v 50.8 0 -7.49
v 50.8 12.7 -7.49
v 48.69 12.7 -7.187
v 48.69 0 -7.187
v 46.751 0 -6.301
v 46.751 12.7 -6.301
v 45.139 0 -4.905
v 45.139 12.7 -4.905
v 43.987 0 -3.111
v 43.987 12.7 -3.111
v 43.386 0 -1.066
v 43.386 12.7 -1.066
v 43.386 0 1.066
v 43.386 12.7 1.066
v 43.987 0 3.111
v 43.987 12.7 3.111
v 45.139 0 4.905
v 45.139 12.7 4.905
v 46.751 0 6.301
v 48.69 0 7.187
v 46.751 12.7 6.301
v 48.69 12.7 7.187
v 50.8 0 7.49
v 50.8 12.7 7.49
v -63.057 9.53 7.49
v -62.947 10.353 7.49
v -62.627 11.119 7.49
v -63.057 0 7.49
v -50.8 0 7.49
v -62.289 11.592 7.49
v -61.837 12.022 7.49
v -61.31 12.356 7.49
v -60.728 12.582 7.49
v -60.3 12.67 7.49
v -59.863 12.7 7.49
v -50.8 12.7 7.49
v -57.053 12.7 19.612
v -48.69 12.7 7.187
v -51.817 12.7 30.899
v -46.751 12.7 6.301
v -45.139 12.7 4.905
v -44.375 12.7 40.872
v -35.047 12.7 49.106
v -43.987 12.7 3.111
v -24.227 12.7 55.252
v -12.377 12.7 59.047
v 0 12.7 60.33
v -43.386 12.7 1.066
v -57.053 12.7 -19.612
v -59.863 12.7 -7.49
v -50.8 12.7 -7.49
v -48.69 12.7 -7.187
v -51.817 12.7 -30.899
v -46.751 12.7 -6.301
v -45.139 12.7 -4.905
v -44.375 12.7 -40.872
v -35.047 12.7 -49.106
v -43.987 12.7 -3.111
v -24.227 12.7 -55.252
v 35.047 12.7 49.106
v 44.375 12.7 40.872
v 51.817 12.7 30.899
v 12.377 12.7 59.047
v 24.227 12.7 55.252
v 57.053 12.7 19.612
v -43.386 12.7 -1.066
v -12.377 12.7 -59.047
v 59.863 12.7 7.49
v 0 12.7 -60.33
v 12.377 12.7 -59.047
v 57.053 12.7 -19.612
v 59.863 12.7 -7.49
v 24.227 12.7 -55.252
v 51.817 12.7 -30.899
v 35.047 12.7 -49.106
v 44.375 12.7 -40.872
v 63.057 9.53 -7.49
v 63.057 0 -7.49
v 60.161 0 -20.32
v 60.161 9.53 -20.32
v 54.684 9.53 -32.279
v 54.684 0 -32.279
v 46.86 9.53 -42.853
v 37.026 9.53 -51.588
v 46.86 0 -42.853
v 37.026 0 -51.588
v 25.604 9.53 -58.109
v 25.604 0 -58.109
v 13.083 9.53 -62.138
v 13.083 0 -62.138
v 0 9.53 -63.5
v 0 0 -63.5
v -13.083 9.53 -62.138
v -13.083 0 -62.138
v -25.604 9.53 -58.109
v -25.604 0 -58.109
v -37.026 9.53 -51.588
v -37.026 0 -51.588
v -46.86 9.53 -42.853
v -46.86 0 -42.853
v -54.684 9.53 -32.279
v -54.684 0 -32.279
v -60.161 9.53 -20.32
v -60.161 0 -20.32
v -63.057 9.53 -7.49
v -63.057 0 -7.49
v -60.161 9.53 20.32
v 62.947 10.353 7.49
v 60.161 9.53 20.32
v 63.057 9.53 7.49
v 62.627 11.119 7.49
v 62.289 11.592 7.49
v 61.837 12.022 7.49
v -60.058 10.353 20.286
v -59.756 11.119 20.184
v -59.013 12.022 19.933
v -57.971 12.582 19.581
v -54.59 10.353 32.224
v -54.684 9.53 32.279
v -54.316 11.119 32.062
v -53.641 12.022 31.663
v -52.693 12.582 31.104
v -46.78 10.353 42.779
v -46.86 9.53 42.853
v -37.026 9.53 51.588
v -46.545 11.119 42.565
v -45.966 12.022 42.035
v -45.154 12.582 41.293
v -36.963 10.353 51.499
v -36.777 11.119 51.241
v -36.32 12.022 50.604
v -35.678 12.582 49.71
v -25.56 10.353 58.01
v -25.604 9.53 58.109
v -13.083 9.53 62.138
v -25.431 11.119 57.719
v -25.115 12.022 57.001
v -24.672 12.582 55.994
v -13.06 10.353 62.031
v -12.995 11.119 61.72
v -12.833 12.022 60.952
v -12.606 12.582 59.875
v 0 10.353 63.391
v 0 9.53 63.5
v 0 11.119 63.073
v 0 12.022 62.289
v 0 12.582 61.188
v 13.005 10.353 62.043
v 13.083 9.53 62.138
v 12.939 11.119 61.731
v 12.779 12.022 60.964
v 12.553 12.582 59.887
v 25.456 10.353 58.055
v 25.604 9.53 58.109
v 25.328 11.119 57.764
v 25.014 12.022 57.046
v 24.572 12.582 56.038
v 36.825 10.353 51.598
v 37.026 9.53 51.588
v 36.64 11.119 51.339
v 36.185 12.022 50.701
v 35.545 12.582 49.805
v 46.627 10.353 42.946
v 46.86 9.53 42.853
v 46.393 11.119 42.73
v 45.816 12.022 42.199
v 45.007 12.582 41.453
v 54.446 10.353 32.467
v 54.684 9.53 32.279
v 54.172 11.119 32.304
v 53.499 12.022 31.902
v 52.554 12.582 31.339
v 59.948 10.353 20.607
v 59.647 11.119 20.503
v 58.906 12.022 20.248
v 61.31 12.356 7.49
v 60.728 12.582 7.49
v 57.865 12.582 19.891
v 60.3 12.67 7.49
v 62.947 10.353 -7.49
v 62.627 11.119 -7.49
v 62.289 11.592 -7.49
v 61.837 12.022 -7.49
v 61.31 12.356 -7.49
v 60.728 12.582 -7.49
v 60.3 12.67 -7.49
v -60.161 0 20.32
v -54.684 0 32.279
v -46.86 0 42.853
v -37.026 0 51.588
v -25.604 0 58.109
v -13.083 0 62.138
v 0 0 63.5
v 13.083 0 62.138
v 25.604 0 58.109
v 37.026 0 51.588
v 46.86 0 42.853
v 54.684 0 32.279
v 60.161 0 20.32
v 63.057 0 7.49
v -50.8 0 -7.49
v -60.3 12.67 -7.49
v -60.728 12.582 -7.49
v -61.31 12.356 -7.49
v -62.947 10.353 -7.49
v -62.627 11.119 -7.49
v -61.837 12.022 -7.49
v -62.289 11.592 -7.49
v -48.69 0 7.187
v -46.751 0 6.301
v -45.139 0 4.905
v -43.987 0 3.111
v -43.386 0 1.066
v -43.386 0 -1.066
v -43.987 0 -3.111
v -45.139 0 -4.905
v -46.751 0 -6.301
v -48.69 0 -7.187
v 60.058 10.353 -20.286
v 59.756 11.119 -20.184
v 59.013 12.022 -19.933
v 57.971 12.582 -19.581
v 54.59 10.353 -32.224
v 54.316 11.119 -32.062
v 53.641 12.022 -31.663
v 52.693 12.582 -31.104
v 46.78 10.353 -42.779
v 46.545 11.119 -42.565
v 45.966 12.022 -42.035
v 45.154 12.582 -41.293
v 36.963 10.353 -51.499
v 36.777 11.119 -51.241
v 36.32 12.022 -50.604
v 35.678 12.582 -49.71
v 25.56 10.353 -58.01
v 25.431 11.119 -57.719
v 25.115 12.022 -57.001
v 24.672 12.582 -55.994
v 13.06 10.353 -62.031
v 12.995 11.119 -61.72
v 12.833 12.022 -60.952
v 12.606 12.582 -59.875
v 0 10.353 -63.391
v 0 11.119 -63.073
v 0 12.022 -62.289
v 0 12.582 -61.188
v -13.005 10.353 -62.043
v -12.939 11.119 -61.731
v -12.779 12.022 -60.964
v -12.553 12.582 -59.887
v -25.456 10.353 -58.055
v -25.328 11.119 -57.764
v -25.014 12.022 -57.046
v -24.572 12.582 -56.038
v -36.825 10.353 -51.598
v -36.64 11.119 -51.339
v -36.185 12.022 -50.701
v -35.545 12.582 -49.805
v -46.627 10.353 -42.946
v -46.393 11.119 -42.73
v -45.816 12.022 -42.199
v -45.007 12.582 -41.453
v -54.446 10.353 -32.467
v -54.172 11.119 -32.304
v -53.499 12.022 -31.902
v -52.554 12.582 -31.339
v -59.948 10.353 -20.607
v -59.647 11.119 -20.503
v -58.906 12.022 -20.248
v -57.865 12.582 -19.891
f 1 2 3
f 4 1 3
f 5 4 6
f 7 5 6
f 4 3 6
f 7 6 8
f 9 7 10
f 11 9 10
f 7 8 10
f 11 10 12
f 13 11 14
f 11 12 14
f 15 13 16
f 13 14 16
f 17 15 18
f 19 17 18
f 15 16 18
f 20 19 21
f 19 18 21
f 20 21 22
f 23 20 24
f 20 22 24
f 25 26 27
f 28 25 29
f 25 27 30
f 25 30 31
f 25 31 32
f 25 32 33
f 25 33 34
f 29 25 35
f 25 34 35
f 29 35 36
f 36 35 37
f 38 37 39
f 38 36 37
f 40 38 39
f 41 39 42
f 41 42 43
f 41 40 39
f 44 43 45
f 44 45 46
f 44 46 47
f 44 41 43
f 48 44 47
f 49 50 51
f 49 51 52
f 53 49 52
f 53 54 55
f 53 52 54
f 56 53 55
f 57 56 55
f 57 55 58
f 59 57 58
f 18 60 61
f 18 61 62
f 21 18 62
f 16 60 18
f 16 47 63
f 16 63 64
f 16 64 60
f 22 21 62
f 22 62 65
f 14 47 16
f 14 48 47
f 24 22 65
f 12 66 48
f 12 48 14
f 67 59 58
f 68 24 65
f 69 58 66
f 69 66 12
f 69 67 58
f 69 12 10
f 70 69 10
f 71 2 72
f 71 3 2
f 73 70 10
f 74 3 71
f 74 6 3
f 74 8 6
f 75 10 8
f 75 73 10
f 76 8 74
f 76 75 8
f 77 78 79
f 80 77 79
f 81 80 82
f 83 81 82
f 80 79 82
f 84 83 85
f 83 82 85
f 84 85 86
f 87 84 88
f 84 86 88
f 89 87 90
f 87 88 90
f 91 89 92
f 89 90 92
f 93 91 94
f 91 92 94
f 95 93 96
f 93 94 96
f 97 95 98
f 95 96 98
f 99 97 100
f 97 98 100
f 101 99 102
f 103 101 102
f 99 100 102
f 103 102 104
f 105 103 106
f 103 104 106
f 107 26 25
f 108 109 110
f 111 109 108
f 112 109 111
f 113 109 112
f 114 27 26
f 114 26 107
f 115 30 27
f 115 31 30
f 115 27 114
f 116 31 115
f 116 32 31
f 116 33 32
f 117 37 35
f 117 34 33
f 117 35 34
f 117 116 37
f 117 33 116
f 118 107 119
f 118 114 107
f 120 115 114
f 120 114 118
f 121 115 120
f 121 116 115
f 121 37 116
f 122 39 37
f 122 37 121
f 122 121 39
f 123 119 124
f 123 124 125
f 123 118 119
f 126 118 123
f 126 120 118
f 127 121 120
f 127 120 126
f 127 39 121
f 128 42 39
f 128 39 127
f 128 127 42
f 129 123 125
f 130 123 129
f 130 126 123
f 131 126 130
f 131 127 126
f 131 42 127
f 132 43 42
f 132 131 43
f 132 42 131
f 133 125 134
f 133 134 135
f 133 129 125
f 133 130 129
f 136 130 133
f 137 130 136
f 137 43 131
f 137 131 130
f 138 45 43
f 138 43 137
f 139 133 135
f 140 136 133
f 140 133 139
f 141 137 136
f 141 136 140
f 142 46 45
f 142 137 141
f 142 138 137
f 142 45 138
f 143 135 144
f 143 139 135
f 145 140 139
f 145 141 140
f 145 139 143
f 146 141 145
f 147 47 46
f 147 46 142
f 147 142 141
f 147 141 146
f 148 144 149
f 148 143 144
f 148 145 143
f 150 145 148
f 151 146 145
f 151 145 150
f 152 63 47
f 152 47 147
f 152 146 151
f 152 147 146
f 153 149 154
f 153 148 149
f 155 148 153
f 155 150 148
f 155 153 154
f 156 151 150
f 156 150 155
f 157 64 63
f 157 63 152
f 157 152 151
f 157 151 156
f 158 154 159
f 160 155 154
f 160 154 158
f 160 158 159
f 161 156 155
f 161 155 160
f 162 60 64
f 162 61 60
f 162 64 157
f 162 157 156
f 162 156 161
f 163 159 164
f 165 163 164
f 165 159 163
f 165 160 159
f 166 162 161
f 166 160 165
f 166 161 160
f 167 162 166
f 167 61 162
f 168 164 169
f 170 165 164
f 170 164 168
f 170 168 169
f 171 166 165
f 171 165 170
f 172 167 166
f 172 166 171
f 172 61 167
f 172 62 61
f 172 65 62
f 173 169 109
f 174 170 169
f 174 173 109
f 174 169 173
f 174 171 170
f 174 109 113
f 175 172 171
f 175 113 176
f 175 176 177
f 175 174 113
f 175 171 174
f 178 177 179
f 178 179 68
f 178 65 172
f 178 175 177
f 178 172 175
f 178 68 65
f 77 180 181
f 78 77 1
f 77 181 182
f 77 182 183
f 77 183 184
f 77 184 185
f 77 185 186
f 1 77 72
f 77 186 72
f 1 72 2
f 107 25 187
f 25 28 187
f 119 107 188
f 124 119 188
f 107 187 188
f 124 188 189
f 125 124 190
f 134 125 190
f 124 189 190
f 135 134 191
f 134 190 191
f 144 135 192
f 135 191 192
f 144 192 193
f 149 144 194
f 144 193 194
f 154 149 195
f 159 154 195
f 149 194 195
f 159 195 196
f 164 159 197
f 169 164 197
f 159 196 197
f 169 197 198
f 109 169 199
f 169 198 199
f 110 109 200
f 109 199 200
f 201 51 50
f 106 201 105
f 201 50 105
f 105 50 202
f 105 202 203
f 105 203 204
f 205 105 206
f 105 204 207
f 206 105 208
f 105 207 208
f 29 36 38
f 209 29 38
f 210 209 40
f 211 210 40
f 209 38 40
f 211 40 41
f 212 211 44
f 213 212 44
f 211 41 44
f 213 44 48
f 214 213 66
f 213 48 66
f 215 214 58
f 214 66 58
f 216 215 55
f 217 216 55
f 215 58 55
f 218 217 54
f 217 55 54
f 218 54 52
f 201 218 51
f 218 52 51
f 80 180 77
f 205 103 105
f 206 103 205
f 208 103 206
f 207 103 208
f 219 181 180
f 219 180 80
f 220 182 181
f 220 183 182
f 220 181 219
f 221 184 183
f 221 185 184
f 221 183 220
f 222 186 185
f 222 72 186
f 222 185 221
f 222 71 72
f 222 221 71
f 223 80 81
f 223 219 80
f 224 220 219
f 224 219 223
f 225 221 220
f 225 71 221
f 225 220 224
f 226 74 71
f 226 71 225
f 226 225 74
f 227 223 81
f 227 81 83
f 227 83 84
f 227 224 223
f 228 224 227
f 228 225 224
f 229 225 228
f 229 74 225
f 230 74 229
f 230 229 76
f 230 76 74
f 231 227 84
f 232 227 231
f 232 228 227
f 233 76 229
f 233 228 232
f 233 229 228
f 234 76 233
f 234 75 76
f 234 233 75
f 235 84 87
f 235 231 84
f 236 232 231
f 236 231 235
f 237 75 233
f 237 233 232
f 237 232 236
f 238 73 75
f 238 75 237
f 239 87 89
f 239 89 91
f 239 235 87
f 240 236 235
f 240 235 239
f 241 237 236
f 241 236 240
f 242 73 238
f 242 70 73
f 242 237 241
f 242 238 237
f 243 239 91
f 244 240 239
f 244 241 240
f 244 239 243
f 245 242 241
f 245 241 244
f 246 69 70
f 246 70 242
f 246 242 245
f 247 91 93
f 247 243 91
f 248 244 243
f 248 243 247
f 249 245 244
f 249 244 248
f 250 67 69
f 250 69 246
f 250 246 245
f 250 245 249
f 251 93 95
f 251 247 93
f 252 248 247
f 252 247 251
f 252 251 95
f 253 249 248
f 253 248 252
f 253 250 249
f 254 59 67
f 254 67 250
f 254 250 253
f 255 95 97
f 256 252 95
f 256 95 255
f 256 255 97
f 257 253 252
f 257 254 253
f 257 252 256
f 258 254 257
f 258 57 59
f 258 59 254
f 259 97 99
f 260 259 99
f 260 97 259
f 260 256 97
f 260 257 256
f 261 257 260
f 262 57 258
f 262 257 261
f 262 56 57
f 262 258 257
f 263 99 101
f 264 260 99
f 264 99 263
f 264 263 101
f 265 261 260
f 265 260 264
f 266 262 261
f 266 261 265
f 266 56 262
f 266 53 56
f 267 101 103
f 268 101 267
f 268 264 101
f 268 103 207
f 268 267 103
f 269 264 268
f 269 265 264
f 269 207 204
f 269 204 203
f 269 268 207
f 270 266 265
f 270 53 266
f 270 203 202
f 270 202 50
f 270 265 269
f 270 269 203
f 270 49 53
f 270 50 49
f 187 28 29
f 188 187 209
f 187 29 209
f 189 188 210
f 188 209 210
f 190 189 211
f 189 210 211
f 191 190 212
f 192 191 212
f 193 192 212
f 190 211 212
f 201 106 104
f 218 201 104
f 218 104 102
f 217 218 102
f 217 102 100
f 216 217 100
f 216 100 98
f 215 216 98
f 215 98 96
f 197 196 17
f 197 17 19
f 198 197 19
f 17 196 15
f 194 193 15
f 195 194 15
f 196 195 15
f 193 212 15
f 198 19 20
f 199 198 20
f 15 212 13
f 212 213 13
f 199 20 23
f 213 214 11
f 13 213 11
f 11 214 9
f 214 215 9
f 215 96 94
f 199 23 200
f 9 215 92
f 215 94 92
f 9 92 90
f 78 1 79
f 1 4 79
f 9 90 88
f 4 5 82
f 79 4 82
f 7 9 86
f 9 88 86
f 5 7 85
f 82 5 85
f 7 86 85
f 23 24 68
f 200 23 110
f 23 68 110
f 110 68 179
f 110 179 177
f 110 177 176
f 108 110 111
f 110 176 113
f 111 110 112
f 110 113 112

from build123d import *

# Parameters (mm, degrees)
SKETCH1_R           = 63.5
BOSS_EXTRUDE2_DEPTH = 12.7
FILLET2_R           = 3.17
CUT_EXTRUDE1_DEPTH  = 13.7


with BuildPart() as part:
    # Sketch1 → Boss-Extrude2 (new body)
    with BuildSketch(Plane(origin=(0, 0, 0), x_dir=(1, 0, 0), z_dir=(0, 1, 0))):
        Circle(SKETCH1_R)
    extrude(amount=BOSS_EXTRUDE2_DEPTH)

    # Fillet2
    fillet2_edges = [part.edges().sort_by_distance(p)[0] for p in [
        (-63.5, 12.7, 0),
    ]]
    fillet(fillet2_edges, radius=FILLET2_R)

    # Sketch3 → Cut-Extrude1 (cut, through all)
    with BuildSketch(Plane(origin=(0, 12.7, 0), x_dir=(1, 0, 0), z_dir=(0, 1, 0))):
        with BuildLine():
            Line((-50.8, 7.49), (-63.056719705, 7.49))
            ThreePointArc((-63.056719705, 7.49), (-63.5, 0), (-63.056719705, -7.49))
            Line((-63.056719705, -7.49), (-50.8, -7.49))
            ThreePointArc((-50.8, -7.49), (-43.31, 0), (-50.8, 7.49))
        make_face()
        with BuildLine():
            Line((50.8, -7.49), (63.056719705, -7.49))
            ThreePointArc((63.056719705, -7.49), (63.5, 0), (63.056719705, 7.49))
            Line((63.056719705, 7.49), (50.8, 7.49))
            ThreePointArc((50.8, 7.49), (43.31, 0), (50.8, -7.49))
        make_face()
    extrude(amount=-CUT_EXTRUDE1_DEPTH, mode=Mode.SUBTRACT)


solid = part.part
